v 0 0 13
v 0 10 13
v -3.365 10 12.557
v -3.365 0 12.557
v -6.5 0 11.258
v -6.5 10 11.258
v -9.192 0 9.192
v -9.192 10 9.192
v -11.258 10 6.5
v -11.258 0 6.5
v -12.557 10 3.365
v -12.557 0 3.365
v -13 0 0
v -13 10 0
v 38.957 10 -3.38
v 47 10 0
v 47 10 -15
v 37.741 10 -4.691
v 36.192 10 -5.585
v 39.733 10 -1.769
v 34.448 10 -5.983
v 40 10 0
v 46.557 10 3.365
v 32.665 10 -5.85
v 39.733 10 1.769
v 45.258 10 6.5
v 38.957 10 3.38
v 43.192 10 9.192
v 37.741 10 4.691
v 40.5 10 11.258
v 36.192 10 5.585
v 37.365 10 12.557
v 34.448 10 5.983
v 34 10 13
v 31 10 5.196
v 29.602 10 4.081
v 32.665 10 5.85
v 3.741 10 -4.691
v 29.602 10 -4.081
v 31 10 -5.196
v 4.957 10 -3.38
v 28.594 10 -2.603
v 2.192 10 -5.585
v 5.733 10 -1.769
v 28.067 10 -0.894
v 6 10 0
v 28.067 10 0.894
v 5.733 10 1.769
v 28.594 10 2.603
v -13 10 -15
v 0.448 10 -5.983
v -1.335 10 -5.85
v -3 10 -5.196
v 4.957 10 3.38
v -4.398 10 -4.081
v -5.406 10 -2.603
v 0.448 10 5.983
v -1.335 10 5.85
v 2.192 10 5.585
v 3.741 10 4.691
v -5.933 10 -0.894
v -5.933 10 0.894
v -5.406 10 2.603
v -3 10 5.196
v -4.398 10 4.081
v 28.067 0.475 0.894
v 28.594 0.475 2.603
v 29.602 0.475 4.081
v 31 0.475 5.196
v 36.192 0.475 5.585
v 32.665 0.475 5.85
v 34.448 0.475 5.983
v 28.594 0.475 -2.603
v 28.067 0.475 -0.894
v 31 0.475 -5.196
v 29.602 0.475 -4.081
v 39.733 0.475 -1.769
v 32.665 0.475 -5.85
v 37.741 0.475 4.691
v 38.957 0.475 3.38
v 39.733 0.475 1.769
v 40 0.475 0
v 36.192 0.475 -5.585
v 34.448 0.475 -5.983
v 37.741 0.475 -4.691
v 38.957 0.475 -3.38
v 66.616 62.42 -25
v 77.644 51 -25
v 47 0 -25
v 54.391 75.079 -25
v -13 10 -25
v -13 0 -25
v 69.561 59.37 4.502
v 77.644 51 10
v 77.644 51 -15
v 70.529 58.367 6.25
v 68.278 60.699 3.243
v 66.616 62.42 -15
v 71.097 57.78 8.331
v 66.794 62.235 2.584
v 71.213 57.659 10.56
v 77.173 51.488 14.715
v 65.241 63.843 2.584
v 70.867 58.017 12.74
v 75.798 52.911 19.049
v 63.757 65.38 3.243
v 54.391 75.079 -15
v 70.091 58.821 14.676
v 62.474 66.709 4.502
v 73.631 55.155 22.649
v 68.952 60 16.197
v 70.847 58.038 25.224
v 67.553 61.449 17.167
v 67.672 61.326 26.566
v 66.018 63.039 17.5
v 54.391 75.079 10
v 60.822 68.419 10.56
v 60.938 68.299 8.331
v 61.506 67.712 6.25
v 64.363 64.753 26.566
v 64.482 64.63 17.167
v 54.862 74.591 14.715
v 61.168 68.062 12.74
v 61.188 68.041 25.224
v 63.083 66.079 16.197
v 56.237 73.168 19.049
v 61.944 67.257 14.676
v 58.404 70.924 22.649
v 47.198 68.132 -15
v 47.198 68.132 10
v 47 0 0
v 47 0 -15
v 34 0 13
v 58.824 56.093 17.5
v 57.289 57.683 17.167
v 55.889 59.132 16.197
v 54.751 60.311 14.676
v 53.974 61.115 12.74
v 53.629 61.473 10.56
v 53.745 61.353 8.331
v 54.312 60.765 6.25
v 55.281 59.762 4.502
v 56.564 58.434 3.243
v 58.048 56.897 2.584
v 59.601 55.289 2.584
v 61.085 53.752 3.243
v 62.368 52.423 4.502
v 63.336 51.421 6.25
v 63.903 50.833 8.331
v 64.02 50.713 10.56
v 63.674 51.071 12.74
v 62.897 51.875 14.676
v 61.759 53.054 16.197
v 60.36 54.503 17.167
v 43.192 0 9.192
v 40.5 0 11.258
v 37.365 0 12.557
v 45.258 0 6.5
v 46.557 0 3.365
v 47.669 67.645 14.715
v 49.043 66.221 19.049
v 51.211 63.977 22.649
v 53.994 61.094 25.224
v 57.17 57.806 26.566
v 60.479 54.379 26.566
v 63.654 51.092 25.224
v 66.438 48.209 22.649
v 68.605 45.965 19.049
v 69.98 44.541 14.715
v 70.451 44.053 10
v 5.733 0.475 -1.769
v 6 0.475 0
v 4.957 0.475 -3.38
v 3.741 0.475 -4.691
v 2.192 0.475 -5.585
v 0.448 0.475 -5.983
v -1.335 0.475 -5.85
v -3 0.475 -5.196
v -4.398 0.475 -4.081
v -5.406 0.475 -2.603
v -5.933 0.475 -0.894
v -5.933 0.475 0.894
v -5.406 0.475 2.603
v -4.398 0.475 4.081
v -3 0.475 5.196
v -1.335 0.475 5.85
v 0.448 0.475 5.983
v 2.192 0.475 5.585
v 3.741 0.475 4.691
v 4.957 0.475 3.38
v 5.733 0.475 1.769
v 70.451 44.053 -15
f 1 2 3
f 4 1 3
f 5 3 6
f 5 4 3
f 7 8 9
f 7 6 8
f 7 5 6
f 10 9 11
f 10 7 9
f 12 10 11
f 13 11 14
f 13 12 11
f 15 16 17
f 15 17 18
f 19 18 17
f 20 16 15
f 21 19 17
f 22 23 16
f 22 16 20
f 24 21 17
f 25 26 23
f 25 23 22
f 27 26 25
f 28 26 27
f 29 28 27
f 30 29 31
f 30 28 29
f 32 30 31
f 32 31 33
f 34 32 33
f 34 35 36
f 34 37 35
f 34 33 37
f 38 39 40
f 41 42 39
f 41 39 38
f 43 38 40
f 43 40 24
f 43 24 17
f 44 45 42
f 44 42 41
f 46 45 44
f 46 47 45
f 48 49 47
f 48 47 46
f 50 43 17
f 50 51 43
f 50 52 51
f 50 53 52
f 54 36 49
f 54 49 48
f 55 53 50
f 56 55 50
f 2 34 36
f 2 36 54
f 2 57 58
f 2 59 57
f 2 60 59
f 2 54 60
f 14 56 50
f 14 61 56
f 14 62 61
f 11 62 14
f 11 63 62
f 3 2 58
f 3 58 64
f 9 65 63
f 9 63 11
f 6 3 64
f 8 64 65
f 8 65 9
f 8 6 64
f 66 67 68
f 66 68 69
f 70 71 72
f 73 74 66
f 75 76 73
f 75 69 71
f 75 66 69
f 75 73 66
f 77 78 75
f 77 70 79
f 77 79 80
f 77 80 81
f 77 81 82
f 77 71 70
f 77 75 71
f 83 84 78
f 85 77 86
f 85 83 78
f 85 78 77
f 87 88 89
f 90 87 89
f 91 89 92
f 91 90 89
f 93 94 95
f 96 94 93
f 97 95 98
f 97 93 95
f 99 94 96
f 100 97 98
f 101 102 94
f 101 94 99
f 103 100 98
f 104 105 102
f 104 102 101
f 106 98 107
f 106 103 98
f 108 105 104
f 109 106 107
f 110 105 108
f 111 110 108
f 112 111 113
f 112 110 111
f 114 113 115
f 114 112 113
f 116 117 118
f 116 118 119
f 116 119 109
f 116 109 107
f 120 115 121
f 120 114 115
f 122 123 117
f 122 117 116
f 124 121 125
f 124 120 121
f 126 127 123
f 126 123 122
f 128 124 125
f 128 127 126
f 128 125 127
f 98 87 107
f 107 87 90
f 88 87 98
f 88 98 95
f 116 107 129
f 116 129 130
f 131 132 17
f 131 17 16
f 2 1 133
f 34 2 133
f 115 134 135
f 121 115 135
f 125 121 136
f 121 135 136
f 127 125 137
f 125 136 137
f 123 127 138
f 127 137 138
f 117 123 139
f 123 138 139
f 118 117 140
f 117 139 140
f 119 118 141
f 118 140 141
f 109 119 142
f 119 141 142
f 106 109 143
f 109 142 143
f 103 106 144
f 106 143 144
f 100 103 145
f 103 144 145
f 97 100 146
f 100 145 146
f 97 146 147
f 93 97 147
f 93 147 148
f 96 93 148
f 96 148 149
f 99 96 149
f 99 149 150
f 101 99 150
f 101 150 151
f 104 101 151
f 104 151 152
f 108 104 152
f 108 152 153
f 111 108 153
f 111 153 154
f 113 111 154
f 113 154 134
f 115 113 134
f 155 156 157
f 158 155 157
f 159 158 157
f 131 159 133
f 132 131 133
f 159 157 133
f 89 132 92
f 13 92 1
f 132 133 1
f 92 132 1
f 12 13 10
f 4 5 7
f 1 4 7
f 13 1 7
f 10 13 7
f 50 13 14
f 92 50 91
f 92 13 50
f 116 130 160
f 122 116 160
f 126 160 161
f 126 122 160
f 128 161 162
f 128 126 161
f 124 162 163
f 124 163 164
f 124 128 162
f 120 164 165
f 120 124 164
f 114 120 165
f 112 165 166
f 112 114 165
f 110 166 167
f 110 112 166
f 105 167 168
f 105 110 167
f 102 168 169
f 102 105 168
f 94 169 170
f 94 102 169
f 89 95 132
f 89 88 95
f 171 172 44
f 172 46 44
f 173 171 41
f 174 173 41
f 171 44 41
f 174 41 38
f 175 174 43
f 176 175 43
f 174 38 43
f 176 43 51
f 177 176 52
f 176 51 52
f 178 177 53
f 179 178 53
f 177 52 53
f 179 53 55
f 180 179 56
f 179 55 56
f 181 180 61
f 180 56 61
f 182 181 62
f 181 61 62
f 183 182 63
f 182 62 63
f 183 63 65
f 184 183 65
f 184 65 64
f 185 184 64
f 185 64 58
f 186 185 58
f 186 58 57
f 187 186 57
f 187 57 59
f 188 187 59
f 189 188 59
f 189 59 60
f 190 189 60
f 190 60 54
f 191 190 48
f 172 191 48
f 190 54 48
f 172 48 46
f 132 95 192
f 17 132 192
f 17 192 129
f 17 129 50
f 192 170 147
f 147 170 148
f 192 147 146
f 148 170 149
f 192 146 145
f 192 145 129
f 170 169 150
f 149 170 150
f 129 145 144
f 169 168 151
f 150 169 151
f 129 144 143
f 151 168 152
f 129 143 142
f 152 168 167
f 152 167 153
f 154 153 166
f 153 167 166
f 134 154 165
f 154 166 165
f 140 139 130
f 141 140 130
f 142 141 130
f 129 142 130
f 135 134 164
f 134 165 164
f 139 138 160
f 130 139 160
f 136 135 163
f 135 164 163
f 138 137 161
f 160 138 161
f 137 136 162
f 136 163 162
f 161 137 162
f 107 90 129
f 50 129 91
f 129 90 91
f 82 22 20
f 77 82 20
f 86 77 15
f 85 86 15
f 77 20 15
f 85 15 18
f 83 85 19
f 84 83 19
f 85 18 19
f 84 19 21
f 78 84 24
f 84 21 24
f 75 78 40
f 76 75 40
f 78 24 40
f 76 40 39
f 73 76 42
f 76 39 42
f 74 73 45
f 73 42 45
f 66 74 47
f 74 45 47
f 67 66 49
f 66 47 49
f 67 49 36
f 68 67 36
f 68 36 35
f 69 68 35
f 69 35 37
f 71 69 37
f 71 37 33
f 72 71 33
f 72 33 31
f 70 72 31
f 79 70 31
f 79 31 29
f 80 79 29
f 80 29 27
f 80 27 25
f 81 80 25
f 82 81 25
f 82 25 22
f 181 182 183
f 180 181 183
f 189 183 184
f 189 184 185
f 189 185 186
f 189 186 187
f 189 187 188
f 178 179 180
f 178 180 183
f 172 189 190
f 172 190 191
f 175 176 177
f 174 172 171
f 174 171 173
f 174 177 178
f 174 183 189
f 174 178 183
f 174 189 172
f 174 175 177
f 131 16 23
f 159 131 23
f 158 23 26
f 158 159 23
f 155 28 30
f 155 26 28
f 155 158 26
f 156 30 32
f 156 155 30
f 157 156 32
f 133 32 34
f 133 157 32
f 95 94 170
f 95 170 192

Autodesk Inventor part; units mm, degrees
ref_plane "YZ Plane" through (0, 0, 0) normal (1, 0, 0) x (0, 1, 0)
ref_plane "XZ Plane" through (0, 0, 0) normal (0, 1, 0) x (-1, 0, 0)
ref_plane "XY Plane" through (0, 0, 0) normal (0, 0, 1) x (1, 0, 0)
sketch "Sketch1" plane through (0, 0, 0) normal (0, 1, 0) x (-1, 0, 0)
  arc A0 (-34, 13) -> (-47, 0) centre (-34, 0) ccw
  arc A1 (13, 0) -> (0, 13) centre (0, 0) ccw
  line L0 (0, 13) -> (-34, 13)
  line L1 (13, 0) -> (13, -25)
  line L2 (13, -25) -> (-47, -25)
  line L3 (-47, -25) -> (-47, 0)
  dimension "d25" = 60
  dimension "d26" = 13
  dimension "d27" = 13
  dimension "d28" = 25
extrude "Extrusion1" add sketch "Sketch1" along normal blind 10
sketch "Sketch2" plane through (0, 10, 0) normal (0, 1, 0) x (1, 0, 0)
  arc A0 (-13, 0) -> (0, -13) centre (0, 0) ccw projected
  arc A1 (34, -13) -> (47, 0) centre (34, 0) ccw projected
  circle A2 centre (0, 0) radius 6
  circle A3 centre (34, 0) radius 6
  dimension "d29" = 12
extrude "Extrusion2" cut sketch "Sketch2" against normal blind 9.525
sketch "Sketch3" plane through (47, 0, -25) normal (0, 0, -1) x (-1, 0, 0)
  line L0 (0, 10) -> (60, 10) projected
  line L1 (0, 0) -> (0, 10) projected
  line L2 (-19.6162, 62.4195) -> (-7.3912, 75.0789)
  line L3 (-19.6162, 62.4195) -> (-30.6439, 51)
  line L4 (-30.6439, 51) -> (0, 0)
  line L5 (-7.3912, 75.0789) -> (60, 10)
  line L6 (0, 0) -> (0, 10)
  line L7 (60, 10) -> (0, 10)
  point P0 (47, 0)
  dimension "d30" = 44
  dimension "d31" = 90
  dimension "d32" = 51
  dimension "d33" = 105
extrude "Extrusion3" add sketch "Sketch3" against normal blind 10
sketch "Sketch4" plane through (54.3912, 75.0789, -25) normal (0.7193398, 0.6946584, 0) x (-0.6946584, 0.7193398, 0)
  line L0 (0, 0) -> (-33.4736, 0) projected
  line L1 (0, 0) -> (0, 10) projected
  line L2 (-33.4736, 10) -> (0, 10) projected
  line L3 (-33.4736, 0) -> (-33.4736, 10) projected
  arc A0 (0, 35) -> (-33.4736, 35) centre (-16.7368, 35) ccw
  line L4 (-33.4736, 35) -> (-33.4736, 0)
  line L5 (-33.4736, 0) -> (0, 0)
  line L6 (0, 0) -> (0, 35)
  point P0 (-16.224, 25)
  dimension "d34" = 35
extrude "Extrusion4" add sketch "Sketch4" against normal blind 10 contours L2 L4 A0 L6
hole "구멍1" at (66.0175, 63.0394, 10) direction (-0.7193398, -0.6946584, 0) diameter 15 end up to surface
properties part number "스터디캐드캠 - 3D 모델링 연습도면 540"
